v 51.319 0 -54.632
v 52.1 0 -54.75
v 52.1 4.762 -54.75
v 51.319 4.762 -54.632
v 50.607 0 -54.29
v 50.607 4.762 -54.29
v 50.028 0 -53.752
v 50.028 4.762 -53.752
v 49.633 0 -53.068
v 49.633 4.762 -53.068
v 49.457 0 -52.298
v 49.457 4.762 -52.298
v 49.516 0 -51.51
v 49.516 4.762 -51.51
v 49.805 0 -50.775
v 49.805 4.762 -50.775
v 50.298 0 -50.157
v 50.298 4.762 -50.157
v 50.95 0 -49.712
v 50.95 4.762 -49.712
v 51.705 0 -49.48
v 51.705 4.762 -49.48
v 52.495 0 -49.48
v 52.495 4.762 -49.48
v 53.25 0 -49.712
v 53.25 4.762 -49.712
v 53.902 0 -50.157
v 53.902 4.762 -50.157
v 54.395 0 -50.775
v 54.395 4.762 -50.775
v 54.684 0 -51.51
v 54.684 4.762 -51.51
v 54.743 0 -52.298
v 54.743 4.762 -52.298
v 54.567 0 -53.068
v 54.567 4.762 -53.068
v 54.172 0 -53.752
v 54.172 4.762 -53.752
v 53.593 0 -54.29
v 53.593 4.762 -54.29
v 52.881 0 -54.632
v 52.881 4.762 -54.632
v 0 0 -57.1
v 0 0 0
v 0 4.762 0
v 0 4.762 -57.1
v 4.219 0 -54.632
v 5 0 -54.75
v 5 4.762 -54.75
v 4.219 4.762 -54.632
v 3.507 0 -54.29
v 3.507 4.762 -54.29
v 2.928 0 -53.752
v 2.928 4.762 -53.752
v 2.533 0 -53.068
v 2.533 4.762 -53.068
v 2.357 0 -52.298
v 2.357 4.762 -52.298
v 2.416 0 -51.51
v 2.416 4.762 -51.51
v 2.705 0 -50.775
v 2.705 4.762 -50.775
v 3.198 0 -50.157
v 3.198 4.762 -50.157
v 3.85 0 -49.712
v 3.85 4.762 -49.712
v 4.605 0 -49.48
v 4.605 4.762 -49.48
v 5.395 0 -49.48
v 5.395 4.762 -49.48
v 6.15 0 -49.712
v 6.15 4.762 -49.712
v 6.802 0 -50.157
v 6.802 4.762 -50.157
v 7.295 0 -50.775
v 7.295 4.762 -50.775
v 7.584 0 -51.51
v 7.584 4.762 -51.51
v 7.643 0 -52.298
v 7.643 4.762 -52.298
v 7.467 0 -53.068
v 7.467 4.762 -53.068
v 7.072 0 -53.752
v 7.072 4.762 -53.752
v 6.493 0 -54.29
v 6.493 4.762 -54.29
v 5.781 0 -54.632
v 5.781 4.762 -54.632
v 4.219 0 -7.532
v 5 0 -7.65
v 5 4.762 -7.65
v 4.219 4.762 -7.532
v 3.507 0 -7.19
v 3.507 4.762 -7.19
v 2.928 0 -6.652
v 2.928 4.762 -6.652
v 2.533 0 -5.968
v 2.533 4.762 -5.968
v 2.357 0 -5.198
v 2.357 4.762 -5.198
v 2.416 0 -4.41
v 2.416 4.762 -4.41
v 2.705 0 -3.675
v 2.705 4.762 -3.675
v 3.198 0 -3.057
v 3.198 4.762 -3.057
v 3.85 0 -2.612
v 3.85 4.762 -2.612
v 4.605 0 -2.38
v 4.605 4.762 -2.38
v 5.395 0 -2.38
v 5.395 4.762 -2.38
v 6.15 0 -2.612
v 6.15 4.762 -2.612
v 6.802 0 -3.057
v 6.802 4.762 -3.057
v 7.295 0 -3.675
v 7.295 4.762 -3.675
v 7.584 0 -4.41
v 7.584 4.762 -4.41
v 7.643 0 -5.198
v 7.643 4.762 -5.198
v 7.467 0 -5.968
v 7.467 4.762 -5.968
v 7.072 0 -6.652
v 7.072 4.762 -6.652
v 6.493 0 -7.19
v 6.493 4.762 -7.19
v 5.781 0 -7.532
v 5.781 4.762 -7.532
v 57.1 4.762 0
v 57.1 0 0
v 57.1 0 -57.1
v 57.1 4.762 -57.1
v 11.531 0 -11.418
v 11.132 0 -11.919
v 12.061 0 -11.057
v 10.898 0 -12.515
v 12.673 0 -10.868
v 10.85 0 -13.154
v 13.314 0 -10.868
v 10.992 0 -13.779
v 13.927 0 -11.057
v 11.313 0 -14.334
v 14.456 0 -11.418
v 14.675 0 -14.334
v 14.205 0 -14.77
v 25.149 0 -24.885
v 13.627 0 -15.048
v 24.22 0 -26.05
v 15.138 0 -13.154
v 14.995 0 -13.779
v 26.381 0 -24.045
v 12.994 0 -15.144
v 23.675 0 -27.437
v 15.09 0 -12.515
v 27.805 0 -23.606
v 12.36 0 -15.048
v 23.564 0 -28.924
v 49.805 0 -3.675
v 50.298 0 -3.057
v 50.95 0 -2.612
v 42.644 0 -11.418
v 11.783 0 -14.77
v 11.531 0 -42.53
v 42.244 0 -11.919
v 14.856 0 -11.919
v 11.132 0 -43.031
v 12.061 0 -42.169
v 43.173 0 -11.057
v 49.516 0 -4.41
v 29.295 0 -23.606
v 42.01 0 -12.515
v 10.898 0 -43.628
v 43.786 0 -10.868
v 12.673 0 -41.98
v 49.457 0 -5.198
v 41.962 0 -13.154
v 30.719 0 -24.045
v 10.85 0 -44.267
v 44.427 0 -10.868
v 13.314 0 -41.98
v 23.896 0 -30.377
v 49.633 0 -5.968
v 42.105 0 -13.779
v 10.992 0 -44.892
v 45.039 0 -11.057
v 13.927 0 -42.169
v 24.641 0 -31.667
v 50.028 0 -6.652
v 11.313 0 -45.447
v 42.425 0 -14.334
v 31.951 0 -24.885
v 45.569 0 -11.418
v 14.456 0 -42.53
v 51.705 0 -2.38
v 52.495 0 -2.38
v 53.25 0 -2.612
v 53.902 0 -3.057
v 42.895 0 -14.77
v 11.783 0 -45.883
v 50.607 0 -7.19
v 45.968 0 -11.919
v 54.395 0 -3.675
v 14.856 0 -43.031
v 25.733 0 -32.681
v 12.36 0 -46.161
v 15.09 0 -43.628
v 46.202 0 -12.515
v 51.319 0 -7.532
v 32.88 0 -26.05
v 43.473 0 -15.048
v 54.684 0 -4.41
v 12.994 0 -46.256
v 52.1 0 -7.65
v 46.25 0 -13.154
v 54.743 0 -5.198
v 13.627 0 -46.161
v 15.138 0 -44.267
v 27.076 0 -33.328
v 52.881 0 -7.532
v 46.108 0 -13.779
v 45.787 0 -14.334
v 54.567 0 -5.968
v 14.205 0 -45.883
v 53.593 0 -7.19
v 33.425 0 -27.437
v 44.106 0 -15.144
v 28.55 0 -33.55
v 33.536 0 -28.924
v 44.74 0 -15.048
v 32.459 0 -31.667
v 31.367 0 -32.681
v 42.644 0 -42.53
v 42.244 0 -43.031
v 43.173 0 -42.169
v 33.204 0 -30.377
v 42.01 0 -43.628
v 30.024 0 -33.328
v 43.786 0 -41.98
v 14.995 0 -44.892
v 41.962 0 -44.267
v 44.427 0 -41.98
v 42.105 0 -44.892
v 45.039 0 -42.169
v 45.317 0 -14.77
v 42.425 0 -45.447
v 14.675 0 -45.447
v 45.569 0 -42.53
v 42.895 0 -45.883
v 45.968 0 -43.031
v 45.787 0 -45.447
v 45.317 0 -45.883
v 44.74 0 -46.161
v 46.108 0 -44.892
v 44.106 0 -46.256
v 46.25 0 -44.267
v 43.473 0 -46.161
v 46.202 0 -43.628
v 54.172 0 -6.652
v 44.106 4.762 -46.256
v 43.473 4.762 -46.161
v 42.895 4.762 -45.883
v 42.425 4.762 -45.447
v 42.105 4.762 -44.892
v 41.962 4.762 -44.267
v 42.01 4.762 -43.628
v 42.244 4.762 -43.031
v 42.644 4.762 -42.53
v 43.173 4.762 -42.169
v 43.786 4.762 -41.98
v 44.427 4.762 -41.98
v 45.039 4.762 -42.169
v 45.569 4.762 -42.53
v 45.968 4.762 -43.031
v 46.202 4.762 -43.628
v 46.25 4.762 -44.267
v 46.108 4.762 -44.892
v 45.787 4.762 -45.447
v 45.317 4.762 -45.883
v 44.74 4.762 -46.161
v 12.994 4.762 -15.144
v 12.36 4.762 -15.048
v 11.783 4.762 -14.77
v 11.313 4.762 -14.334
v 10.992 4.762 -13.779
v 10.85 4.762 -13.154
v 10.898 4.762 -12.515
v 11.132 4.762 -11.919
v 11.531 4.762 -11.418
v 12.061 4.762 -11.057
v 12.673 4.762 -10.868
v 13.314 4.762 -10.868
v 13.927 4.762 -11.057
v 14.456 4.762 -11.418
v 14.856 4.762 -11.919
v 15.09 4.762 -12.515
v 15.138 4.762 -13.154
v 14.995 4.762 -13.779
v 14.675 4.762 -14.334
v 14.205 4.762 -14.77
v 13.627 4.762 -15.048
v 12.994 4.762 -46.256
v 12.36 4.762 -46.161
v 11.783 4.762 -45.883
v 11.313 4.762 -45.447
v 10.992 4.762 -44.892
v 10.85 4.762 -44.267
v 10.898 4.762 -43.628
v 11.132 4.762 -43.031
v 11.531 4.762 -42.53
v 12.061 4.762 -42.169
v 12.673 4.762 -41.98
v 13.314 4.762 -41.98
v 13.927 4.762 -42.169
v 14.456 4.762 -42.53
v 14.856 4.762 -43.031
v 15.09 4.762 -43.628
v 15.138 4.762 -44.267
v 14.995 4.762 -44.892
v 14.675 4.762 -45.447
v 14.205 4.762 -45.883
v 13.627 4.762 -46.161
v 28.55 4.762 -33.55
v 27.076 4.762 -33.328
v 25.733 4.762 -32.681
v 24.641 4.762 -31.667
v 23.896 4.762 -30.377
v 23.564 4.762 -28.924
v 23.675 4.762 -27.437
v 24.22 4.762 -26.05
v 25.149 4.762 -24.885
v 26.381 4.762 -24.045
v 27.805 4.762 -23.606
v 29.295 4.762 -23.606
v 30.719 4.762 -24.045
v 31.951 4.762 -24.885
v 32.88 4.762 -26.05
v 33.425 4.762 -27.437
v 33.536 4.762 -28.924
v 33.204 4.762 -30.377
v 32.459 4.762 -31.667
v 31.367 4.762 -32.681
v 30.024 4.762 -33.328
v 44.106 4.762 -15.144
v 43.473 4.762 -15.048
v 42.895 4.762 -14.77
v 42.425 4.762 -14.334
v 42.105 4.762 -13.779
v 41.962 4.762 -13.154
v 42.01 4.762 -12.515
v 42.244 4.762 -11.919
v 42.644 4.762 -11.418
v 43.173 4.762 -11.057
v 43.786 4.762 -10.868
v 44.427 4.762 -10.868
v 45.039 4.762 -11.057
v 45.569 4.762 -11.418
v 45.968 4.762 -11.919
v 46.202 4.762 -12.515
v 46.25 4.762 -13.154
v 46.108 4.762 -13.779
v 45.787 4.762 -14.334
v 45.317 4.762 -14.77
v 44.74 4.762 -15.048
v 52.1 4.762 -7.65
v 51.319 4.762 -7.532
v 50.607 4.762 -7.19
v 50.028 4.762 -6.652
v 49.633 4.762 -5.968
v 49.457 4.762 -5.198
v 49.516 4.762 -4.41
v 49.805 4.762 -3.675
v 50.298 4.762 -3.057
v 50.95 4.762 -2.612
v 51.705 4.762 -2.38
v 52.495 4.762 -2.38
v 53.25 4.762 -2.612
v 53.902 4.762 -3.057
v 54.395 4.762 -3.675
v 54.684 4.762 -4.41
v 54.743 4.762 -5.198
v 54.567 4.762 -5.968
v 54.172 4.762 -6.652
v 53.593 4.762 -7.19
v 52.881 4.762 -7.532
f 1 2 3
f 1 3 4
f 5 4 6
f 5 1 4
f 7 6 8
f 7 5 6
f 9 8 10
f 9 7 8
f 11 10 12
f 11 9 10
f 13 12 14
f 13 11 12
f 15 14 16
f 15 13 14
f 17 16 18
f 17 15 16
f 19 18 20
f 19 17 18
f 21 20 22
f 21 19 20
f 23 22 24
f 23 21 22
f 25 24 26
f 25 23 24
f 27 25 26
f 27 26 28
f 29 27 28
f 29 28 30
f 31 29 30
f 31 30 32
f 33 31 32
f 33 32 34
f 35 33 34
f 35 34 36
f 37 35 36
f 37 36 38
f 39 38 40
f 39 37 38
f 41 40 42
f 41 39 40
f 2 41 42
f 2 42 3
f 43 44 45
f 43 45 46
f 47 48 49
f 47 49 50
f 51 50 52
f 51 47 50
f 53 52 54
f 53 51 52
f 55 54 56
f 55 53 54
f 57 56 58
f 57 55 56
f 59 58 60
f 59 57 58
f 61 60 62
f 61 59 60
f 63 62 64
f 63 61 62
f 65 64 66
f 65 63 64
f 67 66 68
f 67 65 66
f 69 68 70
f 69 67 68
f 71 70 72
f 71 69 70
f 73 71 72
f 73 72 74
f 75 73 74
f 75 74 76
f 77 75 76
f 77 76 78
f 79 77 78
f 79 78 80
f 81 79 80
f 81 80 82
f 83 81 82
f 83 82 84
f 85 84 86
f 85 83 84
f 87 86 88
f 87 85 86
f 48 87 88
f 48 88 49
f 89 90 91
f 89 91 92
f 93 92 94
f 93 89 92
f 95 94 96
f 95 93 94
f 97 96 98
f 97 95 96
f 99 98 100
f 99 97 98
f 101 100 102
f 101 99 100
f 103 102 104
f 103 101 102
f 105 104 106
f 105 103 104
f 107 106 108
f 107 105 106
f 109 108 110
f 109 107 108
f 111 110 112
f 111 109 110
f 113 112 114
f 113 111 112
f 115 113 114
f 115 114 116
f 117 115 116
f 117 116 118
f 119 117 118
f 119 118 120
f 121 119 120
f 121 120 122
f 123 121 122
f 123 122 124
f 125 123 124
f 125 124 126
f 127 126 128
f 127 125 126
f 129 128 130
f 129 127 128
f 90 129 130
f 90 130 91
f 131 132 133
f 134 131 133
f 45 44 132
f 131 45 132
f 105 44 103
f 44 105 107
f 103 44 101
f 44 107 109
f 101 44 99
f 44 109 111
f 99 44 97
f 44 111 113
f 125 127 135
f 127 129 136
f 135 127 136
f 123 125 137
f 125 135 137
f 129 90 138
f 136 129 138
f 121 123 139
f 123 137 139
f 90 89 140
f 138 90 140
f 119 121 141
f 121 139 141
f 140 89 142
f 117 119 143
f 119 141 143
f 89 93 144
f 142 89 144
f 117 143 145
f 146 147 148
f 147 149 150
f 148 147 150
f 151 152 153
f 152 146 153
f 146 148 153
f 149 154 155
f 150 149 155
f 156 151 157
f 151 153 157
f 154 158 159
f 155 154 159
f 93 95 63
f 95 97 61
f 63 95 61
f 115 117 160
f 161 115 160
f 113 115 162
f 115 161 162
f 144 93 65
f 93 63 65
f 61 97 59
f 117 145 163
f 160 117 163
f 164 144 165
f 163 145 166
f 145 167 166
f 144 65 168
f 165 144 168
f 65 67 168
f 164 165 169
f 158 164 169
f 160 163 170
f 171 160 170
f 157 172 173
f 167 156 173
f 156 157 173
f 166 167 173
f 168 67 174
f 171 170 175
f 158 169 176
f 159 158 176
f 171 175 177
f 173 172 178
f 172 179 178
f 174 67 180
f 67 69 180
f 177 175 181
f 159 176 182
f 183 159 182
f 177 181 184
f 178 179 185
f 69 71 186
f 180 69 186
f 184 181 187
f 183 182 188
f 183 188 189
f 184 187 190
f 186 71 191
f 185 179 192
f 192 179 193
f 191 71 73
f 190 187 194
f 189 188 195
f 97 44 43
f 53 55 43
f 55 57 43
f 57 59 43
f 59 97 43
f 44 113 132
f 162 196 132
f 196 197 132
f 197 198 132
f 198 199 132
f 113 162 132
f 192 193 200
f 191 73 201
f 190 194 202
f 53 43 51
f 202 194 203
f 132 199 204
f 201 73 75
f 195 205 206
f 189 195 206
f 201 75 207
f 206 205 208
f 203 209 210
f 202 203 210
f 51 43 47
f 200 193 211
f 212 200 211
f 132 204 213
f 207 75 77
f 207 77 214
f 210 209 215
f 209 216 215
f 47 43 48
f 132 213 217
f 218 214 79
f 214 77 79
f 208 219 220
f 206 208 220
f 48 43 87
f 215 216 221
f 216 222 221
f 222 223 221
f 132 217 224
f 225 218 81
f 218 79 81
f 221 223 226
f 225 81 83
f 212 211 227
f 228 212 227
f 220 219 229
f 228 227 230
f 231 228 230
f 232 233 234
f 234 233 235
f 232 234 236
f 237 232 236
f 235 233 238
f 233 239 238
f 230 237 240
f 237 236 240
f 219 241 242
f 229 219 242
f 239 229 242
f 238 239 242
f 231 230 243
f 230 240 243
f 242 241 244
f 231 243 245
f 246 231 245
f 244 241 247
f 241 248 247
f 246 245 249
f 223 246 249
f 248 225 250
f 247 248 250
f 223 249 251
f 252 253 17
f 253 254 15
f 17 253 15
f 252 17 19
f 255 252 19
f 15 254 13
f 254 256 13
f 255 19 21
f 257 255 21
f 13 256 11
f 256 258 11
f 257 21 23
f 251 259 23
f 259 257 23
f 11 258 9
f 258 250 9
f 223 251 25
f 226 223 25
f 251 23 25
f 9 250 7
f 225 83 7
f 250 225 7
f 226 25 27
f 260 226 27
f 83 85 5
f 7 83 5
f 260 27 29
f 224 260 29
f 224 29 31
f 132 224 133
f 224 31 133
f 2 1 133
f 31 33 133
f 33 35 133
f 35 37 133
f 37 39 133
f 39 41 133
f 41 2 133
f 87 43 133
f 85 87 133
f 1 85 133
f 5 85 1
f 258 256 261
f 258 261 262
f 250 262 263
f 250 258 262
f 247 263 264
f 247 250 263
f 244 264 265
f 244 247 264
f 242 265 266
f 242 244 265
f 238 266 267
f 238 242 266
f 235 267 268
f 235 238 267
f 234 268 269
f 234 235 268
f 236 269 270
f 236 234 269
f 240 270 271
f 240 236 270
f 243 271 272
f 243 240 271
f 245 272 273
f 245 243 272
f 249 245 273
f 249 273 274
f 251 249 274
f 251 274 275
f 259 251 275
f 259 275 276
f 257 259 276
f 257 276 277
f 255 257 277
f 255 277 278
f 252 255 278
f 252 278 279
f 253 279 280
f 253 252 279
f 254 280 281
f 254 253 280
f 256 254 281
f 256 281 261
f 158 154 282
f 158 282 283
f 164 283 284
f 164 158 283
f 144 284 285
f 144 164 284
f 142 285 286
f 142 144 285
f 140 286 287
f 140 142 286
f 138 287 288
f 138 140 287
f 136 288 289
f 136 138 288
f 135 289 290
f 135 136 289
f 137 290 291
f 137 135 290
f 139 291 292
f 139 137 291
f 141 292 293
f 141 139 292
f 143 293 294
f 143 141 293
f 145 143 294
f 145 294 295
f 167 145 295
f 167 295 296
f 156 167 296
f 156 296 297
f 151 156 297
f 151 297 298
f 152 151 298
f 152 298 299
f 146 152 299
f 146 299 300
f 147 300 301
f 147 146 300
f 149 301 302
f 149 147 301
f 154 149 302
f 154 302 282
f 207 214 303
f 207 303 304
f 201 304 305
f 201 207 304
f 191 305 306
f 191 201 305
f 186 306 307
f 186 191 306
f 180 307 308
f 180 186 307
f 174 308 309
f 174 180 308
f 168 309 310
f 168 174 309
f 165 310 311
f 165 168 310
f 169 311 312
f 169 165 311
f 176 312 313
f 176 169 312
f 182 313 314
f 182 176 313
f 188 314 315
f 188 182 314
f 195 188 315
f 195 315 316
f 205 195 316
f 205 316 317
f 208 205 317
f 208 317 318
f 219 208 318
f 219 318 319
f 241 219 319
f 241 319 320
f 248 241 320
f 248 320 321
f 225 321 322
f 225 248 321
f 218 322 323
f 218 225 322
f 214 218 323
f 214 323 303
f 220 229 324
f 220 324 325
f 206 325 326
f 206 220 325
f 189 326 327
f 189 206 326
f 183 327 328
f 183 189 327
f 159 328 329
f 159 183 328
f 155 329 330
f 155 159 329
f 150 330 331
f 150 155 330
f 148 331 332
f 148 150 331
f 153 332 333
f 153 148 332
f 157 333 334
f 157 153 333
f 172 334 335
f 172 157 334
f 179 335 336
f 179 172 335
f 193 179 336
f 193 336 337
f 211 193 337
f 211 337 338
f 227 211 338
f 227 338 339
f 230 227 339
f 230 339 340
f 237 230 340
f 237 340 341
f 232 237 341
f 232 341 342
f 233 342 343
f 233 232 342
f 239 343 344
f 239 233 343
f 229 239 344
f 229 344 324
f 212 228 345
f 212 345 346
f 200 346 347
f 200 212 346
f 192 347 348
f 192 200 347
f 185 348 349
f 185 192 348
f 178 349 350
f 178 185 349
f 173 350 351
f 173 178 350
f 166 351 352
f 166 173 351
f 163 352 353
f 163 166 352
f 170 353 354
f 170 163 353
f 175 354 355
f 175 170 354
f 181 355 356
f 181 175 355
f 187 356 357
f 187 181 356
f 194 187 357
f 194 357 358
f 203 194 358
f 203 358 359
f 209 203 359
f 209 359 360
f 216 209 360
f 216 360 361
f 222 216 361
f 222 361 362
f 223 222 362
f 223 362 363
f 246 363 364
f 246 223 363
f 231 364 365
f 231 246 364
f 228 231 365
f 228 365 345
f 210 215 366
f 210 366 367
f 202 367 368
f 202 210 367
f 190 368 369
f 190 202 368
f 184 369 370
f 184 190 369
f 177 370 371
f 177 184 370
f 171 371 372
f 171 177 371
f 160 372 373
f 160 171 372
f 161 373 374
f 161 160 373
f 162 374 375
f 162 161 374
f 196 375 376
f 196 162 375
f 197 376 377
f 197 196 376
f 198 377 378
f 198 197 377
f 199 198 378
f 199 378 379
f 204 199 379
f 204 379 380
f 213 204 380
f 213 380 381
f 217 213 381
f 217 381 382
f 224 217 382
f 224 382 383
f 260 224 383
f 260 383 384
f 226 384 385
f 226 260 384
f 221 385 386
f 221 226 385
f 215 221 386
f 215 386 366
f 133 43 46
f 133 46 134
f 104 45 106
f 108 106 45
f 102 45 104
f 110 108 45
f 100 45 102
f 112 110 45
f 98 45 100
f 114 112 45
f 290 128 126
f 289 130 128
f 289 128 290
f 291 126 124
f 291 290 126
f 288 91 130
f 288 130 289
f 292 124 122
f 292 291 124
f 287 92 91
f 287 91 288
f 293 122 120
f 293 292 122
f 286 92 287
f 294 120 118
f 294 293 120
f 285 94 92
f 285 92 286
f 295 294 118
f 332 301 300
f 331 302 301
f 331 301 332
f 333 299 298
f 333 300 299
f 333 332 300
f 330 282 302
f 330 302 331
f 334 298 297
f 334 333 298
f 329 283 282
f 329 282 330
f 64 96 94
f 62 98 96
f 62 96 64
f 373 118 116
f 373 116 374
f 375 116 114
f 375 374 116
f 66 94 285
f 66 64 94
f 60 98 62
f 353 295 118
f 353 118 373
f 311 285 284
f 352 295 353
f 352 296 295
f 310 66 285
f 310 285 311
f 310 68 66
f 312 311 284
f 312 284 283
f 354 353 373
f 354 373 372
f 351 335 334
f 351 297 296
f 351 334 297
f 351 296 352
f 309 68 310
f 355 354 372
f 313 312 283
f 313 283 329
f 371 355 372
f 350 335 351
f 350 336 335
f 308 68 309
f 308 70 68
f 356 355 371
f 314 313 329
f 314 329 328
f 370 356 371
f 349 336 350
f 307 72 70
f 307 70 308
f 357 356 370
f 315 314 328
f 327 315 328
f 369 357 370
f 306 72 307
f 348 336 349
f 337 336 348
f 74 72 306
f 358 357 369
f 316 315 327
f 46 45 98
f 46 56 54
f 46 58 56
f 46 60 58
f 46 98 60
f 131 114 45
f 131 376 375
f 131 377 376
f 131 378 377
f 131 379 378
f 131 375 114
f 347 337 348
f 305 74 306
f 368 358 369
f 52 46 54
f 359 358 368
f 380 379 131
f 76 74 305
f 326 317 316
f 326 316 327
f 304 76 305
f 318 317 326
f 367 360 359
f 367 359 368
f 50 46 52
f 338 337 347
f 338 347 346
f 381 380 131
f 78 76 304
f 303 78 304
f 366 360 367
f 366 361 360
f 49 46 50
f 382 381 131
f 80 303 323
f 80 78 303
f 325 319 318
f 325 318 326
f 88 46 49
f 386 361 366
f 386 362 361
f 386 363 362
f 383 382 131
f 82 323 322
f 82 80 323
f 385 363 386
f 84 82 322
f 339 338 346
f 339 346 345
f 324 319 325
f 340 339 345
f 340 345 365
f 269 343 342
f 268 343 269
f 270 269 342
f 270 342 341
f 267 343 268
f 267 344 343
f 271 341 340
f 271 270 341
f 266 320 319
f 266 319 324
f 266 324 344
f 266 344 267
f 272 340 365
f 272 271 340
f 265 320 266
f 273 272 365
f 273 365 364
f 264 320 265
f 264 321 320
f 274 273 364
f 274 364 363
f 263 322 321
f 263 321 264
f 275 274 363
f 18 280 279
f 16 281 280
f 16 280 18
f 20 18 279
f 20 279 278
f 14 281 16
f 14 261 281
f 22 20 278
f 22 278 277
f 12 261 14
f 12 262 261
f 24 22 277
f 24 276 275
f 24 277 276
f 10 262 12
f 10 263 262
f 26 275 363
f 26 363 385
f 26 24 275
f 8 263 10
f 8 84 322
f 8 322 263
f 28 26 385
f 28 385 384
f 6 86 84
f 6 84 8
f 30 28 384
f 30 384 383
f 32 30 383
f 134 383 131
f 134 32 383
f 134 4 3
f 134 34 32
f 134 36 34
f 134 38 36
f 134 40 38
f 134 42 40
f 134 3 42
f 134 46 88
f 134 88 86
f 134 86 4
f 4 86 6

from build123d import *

# Parameters (mm, degrees)
SKETCH1_W           = 57.1
SKETCH1_H           = 57.1
SKETCH1_R           = 2.15
SKETCH1_R_2         = 2.65
SKETCH1_R_3         = 5
BOSS_EXTRUDE1_DEPTH = 4.7625


with BuildPart() as part:
    # Sketch1 → Boss-Extrude1 (new body)
    with BuildSketch(Plane(origin=(0, 0, 0), x_dir=(1, 0, 0), z_dir=(0, 1, 0))):
        with Locations((28.55, 28.55)):
            Rectangle(SKETCH1_W, SKETCH1_H)
        with Locations(Location((12.993650814, 44.106349186, 0), (0, 0, 90))):
            Circle(SKETCH1_R, mode=Mode.SUBTRACT)
        with Locations(Location((12.993650814, 12.993650814, 0), (0, 0, 90))):
            Circle(SKETCH1_R, mode=Mode.SUBTRACT)
        with Locations(Location((44.106349186, 12.993650814, 0), (0, 0, 90))):
            Circle(SKETCH1_R, mode=Mode.SUBTRACT)
        with Locations(Location((44.106349186, 44.106349186, 0), (0, 0, 90))):
            Circle(SKETCH1_R, mode=Mode.SUBTRACT)
        with Locations(Location((5, 52.1, 0), (0, 0, 90))):
            Circle(SKETCH1_R_2, mode=Mode.SUBTRACT)
        with Locations(Location((52.1, 52.1, 0), (0, 0, 90))):
            Circle(SKETCH1_R_2, mode=Mode.SUBTRACT)
        with Locations(Location((52.1, 5, 0), (0, 0, 90))):
            Circle(SKETCH1_R_2, mode=Mode.SUBTRACT)
        with Locations(Location((5, 5, 0), (0, 0, 90))):
            Circle(SKETCH1_R_2, mode=Mode.SUBTRACT)
        with Locations(Location((28.55, 28.55, 0), (0, 0, 90))):
            Circle(SKETCH1_R_3, mode=Mode.SUBTRACT)
    extrude(amount=BOSS_EXTRUDE1_DEPTH)


solid = part.part
